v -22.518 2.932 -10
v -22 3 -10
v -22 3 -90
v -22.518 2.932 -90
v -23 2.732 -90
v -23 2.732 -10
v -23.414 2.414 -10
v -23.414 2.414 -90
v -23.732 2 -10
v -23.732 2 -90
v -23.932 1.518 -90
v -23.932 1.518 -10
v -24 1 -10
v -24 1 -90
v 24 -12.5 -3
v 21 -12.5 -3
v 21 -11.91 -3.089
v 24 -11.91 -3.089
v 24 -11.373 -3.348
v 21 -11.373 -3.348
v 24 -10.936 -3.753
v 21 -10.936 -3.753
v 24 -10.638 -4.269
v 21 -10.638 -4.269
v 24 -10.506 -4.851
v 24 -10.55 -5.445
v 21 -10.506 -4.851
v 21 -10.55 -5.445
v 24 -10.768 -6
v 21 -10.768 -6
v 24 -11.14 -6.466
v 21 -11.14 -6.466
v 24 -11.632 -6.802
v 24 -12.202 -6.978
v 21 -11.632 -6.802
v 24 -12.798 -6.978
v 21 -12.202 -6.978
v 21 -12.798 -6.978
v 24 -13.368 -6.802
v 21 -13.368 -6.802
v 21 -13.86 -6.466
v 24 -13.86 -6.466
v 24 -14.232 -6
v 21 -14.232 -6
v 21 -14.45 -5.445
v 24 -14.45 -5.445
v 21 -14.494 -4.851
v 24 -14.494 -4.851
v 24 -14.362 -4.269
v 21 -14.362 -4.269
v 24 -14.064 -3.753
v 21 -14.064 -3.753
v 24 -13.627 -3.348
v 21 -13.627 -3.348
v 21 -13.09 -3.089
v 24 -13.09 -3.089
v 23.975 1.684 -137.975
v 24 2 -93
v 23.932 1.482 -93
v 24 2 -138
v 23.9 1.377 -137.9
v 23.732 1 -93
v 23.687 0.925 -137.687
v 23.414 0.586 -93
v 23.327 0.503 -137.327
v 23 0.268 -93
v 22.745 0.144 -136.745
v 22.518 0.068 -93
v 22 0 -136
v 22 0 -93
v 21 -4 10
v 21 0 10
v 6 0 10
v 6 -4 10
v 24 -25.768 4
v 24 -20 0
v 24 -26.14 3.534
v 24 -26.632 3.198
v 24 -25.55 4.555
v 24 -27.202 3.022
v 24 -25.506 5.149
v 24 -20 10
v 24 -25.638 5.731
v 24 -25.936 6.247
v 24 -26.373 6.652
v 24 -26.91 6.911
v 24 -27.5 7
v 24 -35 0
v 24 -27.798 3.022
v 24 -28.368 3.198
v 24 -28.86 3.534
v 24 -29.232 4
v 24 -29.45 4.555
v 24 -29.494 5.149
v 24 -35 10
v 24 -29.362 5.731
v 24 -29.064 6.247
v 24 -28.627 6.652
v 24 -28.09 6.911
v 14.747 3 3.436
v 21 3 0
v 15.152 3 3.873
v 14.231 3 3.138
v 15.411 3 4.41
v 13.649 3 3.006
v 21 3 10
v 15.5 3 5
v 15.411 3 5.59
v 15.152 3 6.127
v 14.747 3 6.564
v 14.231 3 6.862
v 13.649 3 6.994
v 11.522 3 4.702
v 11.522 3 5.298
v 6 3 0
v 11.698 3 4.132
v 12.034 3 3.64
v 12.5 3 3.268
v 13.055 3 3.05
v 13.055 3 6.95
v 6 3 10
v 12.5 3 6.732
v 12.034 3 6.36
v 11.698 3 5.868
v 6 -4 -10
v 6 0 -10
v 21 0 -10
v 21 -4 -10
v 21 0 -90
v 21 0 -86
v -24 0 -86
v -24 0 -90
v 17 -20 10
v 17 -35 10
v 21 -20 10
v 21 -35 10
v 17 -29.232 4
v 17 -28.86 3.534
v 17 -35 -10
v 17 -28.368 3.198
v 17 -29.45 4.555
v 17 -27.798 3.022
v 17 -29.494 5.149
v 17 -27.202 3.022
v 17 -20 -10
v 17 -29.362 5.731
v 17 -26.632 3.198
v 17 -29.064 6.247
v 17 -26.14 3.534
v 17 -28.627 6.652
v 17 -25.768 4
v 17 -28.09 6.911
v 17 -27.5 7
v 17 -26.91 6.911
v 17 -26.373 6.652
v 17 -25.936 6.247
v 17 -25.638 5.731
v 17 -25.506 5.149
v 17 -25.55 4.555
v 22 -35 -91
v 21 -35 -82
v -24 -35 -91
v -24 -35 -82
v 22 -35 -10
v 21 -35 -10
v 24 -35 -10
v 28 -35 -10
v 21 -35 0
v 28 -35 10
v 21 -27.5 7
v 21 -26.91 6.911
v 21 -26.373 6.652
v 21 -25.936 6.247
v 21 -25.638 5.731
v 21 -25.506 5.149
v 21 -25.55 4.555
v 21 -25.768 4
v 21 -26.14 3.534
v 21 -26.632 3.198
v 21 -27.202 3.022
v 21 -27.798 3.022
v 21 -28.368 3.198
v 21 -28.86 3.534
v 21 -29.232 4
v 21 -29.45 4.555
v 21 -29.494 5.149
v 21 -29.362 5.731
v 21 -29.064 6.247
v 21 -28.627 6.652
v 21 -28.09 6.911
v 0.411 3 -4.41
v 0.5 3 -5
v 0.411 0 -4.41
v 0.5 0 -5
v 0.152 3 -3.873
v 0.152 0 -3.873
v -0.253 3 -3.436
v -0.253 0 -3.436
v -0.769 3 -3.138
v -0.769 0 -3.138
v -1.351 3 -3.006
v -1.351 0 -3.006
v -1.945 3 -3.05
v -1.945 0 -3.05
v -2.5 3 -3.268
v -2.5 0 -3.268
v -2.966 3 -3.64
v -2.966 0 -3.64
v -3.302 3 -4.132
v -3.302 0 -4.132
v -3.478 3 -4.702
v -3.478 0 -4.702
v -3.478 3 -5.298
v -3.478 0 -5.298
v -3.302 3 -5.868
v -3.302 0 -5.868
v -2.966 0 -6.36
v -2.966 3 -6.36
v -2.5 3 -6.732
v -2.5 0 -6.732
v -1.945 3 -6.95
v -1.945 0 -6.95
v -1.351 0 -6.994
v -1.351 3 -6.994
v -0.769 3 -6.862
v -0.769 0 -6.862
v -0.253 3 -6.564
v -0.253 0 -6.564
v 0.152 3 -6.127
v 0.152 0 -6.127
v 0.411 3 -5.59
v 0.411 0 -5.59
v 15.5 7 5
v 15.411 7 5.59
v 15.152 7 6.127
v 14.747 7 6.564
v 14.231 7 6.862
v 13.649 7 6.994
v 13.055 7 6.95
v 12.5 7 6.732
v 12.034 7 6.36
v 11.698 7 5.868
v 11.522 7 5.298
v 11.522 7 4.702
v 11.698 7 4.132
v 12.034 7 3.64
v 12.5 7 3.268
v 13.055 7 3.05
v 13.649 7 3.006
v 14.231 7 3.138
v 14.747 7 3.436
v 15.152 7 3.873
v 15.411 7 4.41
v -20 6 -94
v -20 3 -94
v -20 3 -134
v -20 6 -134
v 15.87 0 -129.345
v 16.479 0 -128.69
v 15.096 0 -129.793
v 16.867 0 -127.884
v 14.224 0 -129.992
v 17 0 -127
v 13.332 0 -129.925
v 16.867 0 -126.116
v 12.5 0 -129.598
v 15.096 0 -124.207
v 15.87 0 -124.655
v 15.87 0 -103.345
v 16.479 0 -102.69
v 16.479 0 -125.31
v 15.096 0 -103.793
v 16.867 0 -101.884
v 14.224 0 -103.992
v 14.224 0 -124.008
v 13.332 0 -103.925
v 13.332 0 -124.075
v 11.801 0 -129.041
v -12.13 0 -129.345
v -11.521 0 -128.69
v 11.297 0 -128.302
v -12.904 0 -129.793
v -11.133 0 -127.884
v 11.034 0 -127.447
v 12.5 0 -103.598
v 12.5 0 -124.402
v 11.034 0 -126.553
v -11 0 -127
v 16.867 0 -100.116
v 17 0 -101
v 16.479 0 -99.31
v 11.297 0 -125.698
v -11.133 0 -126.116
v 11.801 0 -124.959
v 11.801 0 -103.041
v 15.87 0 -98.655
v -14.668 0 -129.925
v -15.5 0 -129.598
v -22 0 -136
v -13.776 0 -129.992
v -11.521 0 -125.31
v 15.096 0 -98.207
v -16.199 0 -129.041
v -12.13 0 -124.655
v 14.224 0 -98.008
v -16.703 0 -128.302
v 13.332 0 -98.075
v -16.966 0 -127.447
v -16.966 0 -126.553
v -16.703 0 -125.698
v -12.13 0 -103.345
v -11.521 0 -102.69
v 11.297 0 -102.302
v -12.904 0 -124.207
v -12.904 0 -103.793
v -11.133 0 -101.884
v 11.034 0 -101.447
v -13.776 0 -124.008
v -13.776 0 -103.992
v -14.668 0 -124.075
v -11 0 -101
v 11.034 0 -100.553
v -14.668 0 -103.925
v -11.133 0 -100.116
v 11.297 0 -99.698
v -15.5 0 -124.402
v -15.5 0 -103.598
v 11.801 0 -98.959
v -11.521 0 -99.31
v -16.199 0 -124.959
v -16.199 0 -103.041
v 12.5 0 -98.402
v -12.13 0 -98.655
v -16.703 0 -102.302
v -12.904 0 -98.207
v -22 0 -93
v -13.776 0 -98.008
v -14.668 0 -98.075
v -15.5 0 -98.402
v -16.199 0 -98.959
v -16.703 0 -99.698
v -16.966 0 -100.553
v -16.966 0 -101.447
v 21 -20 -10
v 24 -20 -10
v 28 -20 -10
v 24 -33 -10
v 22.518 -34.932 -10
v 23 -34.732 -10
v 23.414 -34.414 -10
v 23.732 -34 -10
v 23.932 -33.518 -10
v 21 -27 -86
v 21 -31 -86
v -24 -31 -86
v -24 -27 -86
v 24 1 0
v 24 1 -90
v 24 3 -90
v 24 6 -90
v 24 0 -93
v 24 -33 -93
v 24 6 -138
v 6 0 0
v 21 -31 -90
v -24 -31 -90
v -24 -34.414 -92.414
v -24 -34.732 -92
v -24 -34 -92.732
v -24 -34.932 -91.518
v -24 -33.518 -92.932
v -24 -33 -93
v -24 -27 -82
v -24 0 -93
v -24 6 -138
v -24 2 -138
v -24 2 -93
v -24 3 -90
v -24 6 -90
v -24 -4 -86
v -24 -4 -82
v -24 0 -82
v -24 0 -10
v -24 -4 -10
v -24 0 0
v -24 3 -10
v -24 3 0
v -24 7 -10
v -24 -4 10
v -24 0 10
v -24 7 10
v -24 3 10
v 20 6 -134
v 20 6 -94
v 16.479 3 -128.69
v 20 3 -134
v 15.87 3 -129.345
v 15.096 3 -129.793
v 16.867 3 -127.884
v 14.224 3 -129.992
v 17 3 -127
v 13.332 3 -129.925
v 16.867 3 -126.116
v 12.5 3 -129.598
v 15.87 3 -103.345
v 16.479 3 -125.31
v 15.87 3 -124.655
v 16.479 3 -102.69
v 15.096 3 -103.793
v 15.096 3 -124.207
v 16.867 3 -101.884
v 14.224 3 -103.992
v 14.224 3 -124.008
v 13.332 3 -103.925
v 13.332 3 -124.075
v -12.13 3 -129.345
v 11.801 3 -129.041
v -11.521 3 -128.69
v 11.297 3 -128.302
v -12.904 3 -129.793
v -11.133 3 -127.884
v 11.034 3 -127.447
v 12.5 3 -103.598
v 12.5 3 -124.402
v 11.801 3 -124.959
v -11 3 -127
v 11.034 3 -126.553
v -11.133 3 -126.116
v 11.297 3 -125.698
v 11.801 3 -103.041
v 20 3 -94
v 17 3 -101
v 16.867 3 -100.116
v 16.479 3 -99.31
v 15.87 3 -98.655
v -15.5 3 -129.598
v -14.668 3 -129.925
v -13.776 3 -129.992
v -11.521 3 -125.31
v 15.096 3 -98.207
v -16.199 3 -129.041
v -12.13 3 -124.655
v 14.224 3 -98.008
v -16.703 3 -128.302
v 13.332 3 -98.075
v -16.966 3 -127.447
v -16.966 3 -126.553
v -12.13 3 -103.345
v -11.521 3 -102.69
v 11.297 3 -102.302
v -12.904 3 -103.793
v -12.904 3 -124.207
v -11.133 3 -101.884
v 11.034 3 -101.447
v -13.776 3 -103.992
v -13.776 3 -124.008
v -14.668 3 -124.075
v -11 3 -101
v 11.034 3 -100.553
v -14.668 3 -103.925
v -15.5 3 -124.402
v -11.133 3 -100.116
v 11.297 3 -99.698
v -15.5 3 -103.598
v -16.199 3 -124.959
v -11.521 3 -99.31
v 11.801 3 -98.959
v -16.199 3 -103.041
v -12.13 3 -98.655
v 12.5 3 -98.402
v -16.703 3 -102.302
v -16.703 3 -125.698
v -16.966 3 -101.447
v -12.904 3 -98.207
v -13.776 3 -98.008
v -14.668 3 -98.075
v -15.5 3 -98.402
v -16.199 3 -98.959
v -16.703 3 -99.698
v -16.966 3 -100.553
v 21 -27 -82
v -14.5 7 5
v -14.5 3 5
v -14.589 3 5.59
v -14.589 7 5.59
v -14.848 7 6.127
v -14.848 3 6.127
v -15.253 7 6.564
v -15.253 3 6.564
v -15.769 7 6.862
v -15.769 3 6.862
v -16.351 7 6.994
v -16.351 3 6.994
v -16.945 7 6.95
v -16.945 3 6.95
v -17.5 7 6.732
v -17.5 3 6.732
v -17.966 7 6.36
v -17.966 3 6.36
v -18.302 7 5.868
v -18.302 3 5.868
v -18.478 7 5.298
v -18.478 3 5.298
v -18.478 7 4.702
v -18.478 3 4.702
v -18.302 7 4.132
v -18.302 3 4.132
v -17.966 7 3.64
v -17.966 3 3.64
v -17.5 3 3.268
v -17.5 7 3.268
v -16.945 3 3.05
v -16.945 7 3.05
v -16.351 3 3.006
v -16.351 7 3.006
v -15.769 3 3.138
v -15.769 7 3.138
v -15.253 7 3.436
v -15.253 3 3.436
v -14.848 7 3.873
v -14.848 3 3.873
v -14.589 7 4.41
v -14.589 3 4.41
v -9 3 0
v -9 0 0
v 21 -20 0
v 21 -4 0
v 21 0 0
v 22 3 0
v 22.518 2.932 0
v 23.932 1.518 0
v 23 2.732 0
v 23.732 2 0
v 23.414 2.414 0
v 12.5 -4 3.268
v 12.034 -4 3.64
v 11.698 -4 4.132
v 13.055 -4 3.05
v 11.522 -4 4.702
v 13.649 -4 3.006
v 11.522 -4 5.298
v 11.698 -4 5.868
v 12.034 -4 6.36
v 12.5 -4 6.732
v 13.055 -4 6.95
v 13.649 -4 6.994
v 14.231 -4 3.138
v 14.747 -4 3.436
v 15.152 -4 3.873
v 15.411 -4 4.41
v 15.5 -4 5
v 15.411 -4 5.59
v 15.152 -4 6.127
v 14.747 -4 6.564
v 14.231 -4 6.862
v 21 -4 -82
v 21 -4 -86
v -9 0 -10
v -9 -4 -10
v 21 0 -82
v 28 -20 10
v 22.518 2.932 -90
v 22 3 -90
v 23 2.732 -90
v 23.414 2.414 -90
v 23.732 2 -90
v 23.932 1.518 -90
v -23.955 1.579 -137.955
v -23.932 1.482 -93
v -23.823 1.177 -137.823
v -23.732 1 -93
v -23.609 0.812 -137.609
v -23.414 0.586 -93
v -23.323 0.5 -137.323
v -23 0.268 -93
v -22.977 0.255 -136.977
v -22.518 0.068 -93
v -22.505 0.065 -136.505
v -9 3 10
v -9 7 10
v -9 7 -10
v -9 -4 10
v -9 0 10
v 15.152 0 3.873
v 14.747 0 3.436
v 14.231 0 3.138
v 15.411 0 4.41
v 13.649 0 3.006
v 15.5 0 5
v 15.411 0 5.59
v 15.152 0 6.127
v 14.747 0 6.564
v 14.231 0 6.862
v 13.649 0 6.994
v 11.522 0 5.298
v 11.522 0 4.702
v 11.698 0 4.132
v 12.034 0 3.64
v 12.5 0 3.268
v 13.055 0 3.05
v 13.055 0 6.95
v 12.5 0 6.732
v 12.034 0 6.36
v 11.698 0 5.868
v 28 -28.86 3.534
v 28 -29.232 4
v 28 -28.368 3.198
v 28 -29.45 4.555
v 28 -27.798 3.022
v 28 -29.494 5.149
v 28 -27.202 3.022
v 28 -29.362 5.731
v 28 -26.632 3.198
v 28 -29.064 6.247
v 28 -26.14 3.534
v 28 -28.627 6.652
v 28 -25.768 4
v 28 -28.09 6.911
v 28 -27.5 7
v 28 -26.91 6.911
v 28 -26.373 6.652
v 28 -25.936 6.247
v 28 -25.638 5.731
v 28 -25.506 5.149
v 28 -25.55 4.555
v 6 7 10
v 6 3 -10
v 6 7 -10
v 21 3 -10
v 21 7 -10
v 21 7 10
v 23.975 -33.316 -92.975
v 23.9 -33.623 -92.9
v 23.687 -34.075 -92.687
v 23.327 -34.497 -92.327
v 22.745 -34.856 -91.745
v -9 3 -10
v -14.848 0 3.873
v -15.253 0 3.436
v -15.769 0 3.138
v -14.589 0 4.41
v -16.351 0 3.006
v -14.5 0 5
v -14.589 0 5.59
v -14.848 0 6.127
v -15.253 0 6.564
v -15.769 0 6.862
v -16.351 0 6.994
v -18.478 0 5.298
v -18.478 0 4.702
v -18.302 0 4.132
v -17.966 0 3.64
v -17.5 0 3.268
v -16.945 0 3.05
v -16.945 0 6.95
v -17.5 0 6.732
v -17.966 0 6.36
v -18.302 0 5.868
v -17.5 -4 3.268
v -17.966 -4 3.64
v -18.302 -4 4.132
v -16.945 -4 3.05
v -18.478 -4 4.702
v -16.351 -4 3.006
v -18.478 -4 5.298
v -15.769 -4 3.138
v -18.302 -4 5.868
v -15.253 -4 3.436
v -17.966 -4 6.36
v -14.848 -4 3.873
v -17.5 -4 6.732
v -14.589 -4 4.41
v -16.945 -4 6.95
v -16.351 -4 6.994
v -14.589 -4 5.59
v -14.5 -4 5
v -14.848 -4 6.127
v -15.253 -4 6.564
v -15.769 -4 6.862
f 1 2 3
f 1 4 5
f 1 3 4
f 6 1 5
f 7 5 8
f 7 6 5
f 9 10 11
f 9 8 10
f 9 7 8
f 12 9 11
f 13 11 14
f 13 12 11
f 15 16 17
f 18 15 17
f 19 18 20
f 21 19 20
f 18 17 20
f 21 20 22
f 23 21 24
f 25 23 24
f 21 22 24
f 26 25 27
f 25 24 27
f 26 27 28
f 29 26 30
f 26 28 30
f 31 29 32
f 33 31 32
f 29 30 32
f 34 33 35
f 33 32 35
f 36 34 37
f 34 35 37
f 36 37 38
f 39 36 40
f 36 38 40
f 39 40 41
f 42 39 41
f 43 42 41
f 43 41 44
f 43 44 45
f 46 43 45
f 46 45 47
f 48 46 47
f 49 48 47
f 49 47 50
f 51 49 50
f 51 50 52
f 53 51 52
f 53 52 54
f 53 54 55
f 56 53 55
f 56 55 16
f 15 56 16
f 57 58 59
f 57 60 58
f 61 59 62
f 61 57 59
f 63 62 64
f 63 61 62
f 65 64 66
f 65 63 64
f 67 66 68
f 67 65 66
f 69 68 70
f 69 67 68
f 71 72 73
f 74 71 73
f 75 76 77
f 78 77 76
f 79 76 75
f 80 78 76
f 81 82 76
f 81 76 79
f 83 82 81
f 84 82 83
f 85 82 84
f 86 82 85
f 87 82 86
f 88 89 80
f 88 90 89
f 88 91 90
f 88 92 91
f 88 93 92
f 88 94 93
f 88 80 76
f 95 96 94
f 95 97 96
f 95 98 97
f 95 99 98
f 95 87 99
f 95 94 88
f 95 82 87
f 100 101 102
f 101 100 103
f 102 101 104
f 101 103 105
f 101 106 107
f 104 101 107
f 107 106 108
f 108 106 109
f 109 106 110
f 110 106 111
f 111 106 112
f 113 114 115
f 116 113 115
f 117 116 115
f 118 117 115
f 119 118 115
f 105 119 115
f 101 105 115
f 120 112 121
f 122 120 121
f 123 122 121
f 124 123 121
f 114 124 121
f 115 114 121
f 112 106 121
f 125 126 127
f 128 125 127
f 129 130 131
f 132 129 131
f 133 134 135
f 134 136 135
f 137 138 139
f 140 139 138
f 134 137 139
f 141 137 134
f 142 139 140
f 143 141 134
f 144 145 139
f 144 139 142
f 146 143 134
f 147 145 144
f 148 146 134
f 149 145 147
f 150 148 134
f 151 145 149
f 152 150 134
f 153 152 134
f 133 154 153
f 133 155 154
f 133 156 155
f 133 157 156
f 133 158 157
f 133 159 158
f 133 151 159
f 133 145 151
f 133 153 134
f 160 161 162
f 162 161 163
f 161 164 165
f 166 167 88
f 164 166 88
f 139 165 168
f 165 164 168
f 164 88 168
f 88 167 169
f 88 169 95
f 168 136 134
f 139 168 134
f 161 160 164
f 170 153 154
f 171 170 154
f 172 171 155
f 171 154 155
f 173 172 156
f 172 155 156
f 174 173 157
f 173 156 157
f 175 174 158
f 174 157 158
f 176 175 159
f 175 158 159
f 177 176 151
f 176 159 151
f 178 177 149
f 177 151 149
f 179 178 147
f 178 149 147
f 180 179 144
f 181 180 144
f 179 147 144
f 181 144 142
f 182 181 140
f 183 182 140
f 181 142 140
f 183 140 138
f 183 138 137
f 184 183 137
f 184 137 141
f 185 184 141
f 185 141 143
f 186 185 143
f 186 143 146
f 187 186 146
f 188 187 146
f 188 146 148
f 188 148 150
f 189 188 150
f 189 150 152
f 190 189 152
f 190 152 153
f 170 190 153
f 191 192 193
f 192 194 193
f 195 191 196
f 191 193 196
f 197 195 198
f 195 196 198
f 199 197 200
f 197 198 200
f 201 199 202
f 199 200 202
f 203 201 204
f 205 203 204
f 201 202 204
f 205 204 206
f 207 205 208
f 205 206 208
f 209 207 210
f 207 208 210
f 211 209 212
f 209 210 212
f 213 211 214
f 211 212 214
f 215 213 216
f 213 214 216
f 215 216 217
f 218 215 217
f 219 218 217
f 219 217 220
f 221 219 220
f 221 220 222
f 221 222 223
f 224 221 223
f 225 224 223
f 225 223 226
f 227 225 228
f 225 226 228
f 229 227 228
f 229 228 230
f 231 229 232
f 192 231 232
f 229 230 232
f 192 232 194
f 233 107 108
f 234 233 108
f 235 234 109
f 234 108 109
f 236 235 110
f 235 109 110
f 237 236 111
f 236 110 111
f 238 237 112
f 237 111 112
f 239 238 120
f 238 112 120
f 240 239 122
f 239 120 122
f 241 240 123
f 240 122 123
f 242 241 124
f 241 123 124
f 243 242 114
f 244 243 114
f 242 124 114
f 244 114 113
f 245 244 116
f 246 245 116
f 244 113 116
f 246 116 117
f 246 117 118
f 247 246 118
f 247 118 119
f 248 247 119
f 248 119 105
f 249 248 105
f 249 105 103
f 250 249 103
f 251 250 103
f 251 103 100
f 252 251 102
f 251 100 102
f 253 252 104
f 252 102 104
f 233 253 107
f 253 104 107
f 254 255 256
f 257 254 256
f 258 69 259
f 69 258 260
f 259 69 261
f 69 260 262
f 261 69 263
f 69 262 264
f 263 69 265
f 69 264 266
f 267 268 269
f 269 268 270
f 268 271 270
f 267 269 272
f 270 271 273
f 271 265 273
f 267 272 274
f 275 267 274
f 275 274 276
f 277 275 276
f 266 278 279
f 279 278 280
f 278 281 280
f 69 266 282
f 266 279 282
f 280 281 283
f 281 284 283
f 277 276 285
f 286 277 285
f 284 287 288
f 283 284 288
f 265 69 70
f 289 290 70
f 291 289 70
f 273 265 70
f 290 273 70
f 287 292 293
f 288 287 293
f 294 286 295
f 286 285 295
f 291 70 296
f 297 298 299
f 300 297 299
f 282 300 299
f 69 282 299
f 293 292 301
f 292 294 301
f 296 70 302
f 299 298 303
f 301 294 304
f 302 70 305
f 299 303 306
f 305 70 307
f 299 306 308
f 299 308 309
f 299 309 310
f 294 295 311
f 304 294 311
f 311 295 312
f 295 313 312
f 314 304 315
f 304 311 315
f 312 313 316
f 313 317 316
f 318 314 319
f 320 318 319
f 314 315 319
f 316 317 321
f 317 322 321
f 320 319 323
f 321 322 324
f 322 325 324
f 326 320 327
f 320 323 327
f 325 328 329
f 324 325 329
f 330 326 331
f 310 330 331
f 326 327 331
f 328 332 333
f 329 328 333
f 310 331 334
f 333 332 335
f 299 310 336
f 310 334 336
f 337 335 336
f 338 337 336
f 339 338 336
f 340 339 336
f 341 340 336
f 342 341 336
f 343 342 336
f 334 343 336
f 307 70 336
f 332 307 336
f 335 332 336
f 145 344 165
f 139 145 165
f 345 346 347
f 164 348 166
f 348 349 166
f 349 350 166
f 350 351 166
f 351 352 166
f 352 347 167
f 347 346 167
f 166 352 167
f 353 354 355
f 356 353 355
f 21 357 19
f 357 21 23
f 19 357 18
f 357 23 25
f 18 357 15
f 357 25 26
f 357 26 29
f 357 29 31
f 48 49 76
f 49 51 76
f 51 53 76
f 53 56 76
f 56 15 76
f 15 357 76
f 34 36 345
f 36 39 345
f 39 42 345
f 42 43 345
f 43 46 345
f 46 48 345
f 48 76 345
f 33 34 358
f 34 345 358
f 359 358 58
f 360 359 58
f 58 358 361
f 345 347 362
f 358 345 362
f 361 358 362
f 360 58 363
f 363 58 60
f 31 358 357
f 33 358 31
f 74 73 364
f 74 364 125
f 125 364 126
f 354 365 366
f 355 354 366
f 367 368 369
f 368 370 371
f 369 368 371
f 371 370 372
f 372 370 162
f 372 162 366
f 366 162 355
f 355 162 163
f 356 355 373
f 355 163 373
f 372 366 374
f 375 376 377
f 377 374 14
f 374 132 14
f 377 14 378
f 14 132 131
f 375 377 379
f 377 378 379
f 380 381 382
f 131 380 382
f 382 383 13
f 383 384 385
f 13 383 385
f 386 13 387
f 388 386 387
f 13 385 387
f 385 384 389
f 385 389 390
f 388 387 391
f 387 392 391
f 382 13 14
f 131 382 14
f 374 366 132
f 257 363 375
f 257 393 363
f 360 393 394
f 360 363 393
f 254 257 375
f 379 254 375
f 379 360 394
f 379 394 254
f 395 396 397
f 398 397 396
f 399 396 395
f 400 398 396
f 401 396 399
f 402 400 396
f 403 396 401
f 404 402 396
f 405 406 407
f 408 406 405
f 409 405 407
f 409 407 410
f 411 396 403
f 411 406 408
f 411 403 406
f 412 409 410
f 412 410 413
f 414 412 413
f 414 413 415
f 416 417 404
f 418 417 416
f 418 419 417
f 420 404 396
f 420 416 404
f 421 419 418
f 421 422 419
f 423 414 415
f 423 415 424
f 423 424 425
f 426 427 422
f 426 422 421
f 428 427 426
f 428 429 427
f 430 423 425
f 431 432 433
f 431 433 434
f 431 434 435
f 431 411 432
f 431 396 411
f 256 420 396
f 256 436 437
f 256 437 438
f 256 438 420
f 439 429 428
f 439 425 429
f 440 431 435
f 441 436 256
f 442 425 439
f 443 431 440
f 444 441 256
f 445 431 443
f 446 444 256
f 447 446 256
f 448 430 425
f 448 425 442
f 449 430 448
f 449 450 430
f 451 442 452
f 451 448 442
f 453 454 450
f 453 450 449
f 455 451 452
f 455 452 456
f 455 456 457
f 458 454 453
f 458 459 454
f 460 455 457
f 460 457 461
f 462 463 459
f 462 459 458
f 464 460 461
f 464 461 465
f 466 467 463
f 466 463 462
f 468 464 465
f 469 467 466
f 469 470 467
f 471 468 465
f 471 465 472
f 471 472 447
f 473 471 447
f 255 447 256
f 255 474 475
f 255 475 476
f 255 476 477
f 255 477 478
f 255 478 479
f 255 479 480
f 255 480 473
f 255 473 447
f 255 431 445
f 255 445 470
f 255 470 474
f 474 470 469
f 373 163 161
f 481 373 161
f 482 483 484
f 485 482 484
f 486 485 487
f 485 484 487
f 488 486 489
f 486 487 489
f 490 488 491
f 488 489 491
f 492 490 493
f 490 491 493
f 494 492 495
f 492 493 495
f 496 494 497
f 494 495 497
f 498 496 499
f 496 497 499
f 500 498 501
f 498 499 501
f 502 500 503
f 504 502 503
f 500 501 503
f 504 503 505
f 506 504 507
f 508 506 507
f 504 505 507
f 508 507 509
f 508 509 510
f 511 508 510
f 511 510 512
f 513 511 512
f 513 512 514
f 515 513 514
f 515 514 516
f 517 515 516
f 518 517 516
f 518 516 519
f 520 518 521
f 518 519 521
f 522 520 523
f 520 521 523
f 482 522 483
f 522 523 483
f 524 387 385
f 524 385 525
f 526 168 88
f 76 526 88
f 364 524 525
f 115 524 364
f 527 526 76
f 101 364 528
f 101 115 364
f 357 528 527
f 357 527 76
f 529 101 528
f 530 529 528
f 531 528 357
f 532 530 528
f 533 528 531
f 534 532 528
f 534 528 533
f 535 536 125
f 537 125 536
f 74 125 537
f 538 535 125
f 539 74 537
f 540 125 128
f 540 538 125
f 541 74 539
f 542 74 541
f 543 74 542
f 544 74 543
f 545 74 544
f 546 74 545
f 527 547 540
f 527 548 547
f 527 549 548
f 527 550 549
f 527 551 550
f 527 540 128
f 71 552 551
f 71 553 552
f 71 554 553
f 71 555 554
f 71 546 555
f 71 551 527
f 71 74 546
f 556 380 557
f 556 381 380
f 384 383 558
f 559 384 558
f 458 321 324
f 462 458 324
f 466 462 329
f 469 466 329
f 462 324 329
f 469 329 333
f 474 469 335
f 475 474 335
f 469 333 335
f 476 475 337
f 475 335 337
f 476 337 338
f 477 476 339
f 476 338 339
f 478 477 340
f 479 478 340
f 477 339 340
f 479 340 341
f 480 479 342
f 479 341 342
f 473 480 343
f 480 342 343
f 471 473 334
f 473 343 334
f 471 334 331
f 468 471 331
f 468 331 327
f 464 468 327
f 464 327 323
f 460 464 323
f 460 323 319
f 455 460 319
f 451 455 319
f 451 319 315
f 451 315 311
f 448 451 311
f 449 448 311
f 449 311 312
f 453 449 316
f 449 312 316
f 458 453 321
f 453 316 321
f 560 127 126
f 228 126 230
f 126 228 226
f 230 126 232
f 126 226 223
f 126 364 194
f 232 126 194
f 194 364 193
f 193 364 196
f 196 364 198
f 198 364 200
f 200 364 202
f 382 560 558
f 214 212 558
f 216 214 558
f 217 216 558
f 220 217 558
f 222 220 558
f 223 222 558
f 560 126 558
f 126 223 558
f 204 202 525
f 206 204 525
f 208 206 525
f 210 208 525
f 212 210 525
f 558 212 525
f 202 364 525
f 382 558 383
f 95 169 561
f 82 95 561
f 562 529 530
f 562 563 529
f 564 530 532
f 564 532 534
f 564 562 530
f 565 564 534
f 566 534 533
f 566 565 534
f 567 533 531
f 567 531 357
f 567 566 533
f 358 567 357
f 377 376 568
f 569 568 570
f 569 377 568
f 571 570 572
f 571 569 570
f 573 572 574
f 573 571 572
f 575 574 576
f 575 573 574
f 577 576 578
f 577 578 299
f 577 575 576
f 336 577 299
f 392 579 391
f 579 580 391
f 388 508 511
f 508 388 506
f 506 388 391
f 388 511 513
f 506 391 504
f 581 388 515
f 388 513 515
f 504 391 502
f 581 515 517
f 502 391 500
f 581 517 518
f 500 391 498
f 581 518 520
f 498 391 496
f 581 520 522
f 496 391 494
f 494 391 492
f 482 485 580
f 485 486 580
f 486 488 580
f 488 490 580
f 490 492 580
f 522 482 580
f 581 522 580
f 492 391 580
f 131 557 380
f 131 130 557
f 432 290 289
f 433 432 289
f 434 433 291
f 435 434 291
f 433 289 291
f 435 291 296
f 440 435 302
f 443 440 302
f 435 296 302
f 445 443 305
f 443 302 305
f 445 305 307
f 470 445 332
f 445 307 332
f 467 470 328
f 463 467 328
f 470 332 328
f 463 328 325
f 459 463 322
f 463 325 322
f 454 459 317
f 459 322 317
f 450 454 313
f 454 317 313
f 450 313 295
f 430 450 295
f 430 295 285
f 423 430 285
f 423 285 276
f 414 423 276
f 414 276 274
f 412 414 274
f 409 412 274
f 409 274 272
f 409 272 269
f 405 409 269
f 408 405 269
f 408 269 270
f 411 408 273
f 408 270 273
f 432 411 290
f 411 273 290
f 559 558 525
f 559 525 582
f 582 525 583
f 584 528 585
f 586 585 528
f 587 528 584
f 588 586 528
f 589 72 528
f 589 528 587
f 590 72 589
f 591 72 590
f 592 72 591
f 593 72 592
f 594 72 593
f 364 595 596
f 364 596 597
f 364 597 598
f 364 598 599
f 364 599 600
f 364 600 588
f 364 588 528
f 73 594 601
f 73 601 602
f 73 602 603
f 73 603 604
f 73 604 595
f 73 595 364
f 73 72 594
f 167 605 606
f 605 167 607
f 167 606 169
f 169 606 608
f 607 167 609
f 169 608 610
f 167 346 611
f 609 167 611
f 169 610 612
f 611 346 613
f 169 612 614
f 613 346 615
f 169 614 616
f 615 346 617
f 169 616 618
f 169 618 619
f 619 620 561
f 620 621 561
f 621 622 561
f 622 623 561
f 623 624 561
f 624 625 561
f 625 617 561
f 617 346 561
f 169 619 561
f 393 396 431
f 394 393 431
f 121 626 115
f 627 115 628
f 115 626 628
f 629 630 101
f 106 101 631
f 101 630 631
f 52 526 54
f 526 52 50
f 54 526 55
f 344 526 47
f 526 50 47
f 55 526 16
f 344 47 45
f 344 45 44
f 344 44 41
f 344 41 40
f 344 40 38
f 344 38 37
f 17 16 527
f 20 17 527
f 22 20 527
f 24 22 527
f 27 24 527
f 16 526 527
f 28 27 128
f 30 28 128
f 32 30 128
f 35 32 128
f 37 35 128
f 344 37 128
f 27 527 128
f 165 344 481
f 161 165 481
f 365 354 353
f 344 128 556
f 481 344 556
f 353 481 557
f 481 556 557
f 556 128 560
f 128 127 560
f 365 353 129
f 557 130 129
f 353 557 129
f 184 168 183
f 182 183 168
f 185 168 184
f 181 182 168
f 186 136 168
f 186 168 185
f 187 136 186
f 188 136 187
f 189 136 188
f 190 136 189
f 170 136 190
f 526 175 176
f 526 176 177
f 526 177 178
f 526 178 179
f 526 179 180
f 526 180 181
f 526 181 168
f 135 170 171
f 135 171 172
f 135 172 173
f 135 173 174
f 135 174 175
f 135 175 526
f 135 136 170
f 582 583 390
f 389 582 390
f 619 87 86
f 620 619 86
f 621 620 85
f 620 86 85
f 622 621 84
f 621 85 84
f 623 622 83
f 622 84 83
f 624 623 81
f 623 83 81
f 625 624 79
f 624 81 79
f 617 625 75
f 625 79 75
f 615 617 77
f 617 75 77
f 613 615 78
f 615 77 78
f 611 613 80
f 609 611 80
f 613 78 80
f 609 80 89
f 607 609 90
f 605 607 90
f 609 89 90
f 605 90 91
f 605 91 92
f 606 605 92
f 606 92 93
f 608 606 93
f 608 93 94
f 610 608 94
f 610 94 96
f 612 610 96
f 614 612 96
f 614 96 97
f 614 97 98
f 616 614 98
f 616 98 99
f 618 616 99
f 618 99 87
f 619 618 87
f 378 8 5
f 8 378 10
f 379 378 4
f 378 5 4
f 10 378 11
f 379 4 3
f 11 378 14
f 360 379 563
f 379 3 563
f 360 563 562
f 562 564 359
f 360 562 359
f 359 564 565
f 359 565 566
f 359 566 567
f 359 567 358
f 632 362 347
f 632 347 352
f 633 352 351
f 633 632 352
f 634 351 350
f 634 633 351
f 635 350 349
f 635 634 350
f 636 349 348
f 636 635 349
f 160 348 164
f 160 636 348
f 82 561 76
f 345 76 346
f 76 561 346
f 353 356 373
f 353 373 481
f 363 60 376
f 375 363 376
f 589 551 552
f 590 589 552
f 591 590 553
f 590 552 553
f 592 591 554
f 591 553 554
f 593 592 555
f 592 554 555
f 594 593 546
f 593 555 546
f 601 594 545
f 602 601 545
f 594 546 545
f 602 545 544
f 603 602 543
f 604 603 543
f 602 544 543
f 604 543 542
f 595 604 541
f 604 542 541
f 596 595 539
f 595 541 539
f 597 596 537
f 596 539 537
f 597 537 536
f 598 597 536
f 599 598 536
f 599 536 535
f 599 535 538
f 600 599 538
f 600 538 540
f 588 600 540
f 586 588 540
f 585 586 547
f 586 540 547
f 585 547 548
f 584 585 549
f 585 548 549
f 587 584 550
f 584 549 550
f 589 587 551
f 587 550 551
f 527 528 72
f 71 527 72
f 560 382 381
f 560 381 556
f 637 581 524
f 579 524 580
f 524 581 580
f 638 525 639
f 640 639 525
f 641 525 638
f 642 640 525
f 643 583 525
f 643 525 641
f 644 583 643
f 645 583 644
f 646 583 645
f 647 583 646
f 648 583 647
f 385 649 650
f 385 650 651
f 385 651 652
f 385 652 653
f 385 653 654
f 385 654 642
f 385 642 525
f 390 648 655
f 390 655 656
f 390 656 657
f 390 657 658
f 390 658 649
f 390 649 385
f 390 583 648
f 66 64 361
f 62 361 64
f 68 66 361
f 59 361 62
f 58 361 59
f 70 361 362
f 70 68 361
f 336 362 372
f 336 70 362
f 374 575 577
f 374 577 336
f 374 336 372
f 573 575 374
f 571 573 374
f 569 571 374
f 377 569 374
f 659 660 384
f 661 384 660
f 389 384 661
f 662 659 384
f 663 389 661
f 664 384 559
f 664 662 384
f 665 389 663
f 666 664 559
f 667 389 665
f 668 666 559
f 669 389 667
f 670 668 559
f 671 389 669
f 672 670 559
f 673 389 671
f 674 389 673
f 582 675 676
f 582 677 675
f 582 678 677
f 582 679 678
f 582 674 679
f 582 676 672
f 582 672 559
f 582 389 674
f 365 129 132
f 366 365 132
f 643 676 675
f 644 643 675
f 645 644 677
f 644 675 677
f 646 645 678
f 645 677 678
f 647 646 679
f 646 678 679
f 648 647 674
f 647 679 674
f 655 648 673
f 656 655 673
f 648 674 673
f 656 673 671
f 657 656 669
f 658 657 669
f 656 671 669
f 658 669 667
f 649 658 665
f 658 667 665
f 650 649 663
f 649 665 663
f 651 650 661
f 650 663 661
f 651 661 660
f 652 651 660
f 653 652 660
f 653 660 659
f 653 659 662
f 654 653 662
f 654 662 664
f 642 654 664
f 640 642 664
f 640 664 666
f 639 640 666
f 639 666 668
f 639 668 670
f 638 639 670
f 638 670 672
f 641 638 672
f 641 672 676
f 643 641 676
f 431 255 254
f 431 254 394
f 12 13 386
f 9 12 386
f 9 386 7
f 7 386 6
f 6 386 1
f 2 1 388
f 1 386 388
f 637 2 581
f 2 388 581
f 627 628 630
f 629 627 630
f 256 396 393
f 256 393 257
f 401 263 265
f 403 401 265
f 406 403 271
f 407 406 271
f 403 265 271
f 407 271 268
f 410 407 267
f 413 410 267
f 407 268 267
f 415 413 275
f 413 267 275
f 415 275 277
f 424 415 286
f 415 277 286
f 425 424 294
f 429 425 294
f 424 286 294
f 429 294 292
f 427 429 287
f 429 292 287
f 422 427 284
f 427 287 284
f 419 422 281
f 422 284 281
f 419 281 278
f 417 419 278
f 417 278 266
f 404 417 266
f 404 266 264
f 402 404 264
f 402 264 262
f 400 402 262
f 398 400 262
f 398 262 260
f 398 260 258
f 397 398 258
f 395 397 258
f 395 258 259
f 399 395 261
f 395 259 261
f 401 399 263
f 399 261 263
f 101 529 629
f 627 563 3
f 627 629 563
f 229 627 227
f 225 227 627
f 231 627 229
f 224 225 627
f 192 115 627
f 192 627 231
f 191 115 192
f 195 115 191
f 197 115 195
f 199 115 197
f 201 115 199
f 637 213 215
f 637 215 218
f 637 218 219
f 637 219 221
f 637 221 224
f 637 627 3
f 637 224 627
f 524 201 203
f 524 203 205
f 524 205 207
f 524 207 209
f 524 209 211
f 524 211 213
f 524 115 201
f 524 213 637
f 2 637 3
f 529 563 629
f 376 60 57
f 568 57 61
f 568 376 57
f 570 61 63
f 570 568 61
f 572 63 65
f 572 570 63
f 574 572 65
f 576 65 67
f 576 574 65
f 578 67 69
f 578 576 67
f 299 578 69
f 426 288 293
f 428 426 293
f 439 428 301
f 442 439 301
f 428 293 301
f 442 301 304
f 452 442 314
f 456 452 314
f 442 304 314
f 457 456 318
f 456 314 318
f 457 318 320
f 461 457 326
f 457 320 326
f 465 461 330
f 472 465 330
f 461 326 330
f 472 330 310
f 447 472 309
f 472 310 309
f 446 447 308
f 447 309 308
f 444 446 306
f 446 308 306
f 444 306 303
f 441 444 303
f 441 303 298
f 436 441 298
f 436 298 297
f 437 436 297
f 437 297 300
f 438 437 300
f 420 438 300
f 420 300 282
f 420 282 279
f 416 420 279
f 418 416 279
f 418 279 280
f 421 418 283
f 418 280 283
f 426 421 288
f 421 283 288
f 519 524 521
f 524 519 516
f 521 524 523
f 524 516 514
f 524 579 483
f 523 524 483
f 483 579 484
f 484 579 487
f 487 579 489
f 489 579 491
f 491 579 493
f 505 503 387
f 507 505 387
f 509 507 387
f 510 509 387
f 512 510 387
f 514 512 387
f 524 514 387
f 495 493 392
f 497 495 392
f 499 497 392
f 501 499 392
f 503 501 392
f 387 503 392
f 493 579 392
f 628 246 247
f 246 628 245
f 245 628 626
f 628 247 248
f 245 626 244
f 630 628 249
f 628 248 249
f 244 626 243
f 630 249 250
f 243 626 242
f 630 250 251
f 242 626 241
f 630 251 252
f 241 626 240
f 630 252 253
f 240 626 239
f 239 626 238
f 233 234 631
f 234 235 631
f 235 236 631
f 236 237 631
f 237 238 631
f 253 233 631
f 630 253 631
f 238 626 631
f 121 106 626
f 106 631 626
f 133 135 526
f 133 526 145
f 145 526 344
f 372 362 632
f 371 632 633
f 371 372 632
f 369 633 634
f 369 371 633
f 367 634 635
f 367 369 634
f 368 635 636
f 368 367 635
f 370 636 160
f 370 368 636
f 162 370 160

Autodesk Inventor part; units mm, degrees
ref_plane "YZ Plane" through (0, 0, 0) normal (1, 0, 0) x (0, 1, 0)
ref_plane "XZ Plane" through (0, 0, 0) normal (0, 1, 0) x (-1, 0, 0)
ref_plane "XY Plane" through (0, 0, 0) normal (0, 0, 1) x (1, 0, 0)
sketch "Sketch1" plane through (0, 0, 0) normal (0, 1, 0) x (-1, 0, 0)
  line L0 (24, 138) -> (-24, 138)
  line L1 (-24, 138) -> (-24, -138)
  line L2 (-24, -138) -> (24, -138)
  line L3 (24, -138) -> (24, 138)
  point P0 (0, 0)
  dimension "d0" = 48
  dimension "d1" = 276
extrude "Extrusion1" add sketch "Sketch1" along normal blind 3
sketch "Sketch2" plane through (0, 3, 0) normal (0, 1, 0) x (1, 0, 0)
  line L0 (-24, 138) -> (-24, -138) projected
  line L1 (-24, -138) -> (-20, -138)
  line L2 (-20, -138) -> (-20, -90)
  line L3 (-20, -90) -> (-24, -90)
  line L4 (-24, -90) -> (-24, -138)
  line L5 (24, -138) -> (24, 138) projected
  line L6 (-20, -90) -> (24, -90)
  line L7 (24, -90) -> (24, -94)
  line L8 (24, -94) -> (-20, -94)
  line L9 (-20, -94) -> (-20, -90)
  line L10 (-24, -138) -> (24, -138) projected
  line L11 (24, -94) -> (20, -94)
  line L12 (20, -94) -> (20, -138)
  line L13 (20, -138) -> (24, -138)
  line L14 (24, -138) -> (24, -94)
  line L15 (20, -138) -> (-20, -138)
  line L16 (-20, -138) -> (-20, -134)
  line L17 (-20, -134) -> (20, -134)
  line L18 (20, -134) -> (20, -138)
  point P0 (0, 0)
  dimension "d4" = 4
  dimension "d5" = 48
  dimension "d6" = 4
  dimension "d7" = 4
  dimension "d8" = 4
extrude "Extrusion2" add sketch "Sketch2" along normal blind 3 contours L3 L2 L1 L0 | L6 L5 L8 L2 | L2 L17 L12 L10 | L12 L8 L5 L10
mirror "Mirror1" about plane through (0, 0, 0) normal (0, 0, 1) of "Extrusion2"
sketch "Sketch3" plane through (0, 0, 0) normal (0, -1, 0) x (1, 0, 0)
  line L0 (24, -90) -> (-24, -90) projected
  line L1 (24, 138) -> (24, -138) projected
  line L2 (-24, -90) -> (24, -90)
  line L3 (24, -90) -> (24, -93)
  line L4 (24, -93) -> (-24, -93)
  line L5 (-24, -93) -> (-24, -90)
  line L6 (-24, 90) -> (24, 90) projected
  line L7 (24, 90) -> (21, 90)
  line L8 (21, 90) -> (21, -90)
  line L9 (21, -90) -> (24, -90)
  line L10 (24, -90) -> (24, 90)
  line L11 (-24, 90) -> (24, 90)
  line L12 (24, 90) -> (24, 93)
  line L13 (24, 93) -> (-24, 93)
  line L14 (-24, 93) -> (-24, 90)
  point P0 (0, 0)
  dimension "d11" = 3
  dimension "d12" = 3
  dimension "d13" = 3
extrude "Extrusion3" add sketch "Sketch3" along normal blind 35
sketch "Sketch4" plane through (-24, 0, -90) normal (0, 0, 1) x (1, 0, 0)
  line L0 (0, -35) -> (45, -35) projected
  line L1 (45, 0) -> (45, -35) projected
  line L2 (0, -35) -> (45, -35)
  line L3 (45, -35) -> (45, -31)
  line L4 (45, -31) -> (0, -31)
  line L5 (0, -31) -> (0, -35)
  point P0 (24, 0)
  dimension "d16" = 4
extrude "Extrusion4" add sketch "Sketch4" along normal blind 8
sketch "Sketch5" plane through (-24, -31, -90) normal (0, 1, 0) x (1, 0, 0)
  line L0 (0, -8) -> (45, -8) projected
  line L1 (45, 0) -> (45, -8) projected
  line L2 (0, -8) -> (45, -8)
  line L3 (45, -8) -> (45, -4)
  line L4 (45, -4) -> (0, -4)
  line L5 (0, -4) -> (0, -8)
  point P0 (24, -90)
  dimension "d19" = 4
extrude "Extrusion5" add sketch "Sketch5" along normal blind 4
sketch "Sketch6" plane through (0, 0, 0) normal (0, -1, 0) x (1, 0, 0)
  line L0 (21, -86) -> (-24, -86) projected
  line L1 (-24, -82) -> (21, -82)
  line L2 (21, -82) -> (21, -86)
  line L3 (21, -86) -> (-24, -86)
  line L4 (-24, -86) -> (-24, -82)
  point P0 (0, 0)
  dimension "d22" = 4
extrude "Extrusion6" add sketch "Sketch6" along normal blind 4
mirror "Mirror2" about plane through (0, 0, 0) normal (0, 0, 1) of "Extrusion6", "Extrusion5", "Extrusion4"
sketch "Sketch7" plane through (0, 0, 0) normal (0, -1, 0) x (1, 0, 0)
  circle A0 centre (-14, -127) radius 3
  circle A1 centre (14, -127) radius 3
  circle A2 centre (14, -101) radius 3
  circle A3 centre (-14, -101) radius 3
  line L0 (-20, -94) -> (20, -94) projected
  line L1 (20, -134) -> (-20, -134) projected
  line L2 (20, -94) -> (20, -134) projected
  point P0 (0, 0)
  dimension "d25" = 6
  dimension "d26" = 6
  dimension "d27" = 6
  dimension "d28" = 6
  dimension "d80" = 28
  dimension "d81" = 26
  dimension "d82" = 26
  dimension "d83" = 28
  dimension "d84" = 7
  dimension "d85" = 7
  dimension "d86" = 7
  dimension "d87" = 6
extrude "Extrusion7" cut sketch "Sketch7" against normal blind 4
mirror "Mirror3" about plane through (0, 0, 0) normal (0, 0, 1) of "Extrusion7"
sketch "Sketch12" plane through (0, 0, 0) normal (0, -1, 0) x (1, 0, 0)
  line L0 (-24, -82) -> (-24, 82) projected
  line L1 (-24, 0) -> (24, 0)
  line L2 (24, 0) -> (24, 138)
  line L3 (24, 138) -> (-24, 138)
  line L4 (-24, 138) -> (-24, 0)
  point P0 (0, 0)
  point P1 (-24, -17)
extrude "Extrusion12" cut sketch "Sketch12" along normal mid plane 100
sketch "Sketch13" plane through (0, 0, 0) normal (0, -1, 0) x (1, 0, 0)
  line L0 (-24, -90) -> (-24, 0) projected
  line L1 (-24, -10) -> (-9, -10)
  line L2 (-9, -10) -> (-9, 10)
  line L3 (-9, 10) -> (-24, 10)
  line L4 (-24, 10) -> (-24, -10)
  line L5 (6, -10) -> (21, -10)
  line L6 (21, -10) -> (21, 10)
  line L7 (21, 10) -> (6, 10)
  line L8 (6, 10) -> (6, -10)
  point P0 (0, 0)
  dimension "d55" = 15
  dimension "d56" = 20
  dimension "d57" = 15
  dimension "d58" = 20
extrude "Extrusion13" add sketch "Sketch13" along normal blind 4 and the other way blind 7
sketch "Sketch14" plane through (21, -31, -90) normal (-1, 0, 0) x (0, 0, 1)
  point P0 (90, 31)
sketch "Sketch15" plane through (21, -31, -90) normal (-1, 0, 0) x (0, 0, 1)
  line L0 (90, -4) -> (8, -4) projected
  line L1 (80, -4) -> (100, -4)
  line L2 (100, -4) -> (100, 11)
  line L3 (100, 11) -> (80, 11)
  line L4 (80, 11) -> (80, -4)
  point P0 (90, 31)
  dimension "d63" = 20
  dimension "d64" = 15
extrude "Extrusion14" add sketch "Sketch15" along normal blind 4 and the other way blind 7
sketch "Sketch16" plane through (0, -4, 0) normal (0, -1, 0) x (1, 0, 0)
  circle A0 centre (-16.5, 5) radius 2
  circle A1 centre (13.5, 5) radius 2
  circle A2 centre (-1.5, -5) radius 2
  point P0 (0, 0)
  dimension "d69" = 4
  dimension "d70" = 4
  dimension "d71" = 4
extrude "Extrusion15" cut sketch "Sketch16" against normal blind 20
sketch "Sketch17" plane through (17, -31, -90) normal (-1, 0, 0) x (0, 0, 1)
  circle A0 centre (95, 3.5) radius 2
  circle A1 centre (85, 18.5) radius 2
  point P0 (90, 31)
  dimension "d74" = 4
  dimension "d75" = 4
extrude "Extrusion16" cut sketch "Sketch17" against normal blind 20
sketch "Sketch18" plane through (-24, -4, 10) normal (0, 0, 1) x (1, 0, 0)
  line L0 (48, 4) -> (48, -31) projected
  line L1 (45, -31) -> (45, -16) projected
  line L2 (48, -31) -> (45, -31)
  line L3 (45, -31) -> (45, -16)
  line L4 (45, -16) -> (48, -16)
  line L5 (48, -16) -> (48, -31)
  line L6 (48, 7) -> (0, 7) projected
  line L7 (45, 4) -> (0, 4)
  line L8 (0, 4) -> (0, 7)
  line L9 (0, 7) -> (45, 7)
  line L10 (45, 7) -> (45, 4)
  point P0 (24, 4)
extrude "Extrusion17" cut sketch "Sketch18" against normal blind 10
fillet "Fillet1" radius 2 7 edges at (24, -35, -51.5) (24, 3, -45) (-24, 3, -50) (-24, 0, -115.5) (0, 0, -138) (24, 0, -115.5) (0, -35, -93)
properties part number "carriageEnd2R"
